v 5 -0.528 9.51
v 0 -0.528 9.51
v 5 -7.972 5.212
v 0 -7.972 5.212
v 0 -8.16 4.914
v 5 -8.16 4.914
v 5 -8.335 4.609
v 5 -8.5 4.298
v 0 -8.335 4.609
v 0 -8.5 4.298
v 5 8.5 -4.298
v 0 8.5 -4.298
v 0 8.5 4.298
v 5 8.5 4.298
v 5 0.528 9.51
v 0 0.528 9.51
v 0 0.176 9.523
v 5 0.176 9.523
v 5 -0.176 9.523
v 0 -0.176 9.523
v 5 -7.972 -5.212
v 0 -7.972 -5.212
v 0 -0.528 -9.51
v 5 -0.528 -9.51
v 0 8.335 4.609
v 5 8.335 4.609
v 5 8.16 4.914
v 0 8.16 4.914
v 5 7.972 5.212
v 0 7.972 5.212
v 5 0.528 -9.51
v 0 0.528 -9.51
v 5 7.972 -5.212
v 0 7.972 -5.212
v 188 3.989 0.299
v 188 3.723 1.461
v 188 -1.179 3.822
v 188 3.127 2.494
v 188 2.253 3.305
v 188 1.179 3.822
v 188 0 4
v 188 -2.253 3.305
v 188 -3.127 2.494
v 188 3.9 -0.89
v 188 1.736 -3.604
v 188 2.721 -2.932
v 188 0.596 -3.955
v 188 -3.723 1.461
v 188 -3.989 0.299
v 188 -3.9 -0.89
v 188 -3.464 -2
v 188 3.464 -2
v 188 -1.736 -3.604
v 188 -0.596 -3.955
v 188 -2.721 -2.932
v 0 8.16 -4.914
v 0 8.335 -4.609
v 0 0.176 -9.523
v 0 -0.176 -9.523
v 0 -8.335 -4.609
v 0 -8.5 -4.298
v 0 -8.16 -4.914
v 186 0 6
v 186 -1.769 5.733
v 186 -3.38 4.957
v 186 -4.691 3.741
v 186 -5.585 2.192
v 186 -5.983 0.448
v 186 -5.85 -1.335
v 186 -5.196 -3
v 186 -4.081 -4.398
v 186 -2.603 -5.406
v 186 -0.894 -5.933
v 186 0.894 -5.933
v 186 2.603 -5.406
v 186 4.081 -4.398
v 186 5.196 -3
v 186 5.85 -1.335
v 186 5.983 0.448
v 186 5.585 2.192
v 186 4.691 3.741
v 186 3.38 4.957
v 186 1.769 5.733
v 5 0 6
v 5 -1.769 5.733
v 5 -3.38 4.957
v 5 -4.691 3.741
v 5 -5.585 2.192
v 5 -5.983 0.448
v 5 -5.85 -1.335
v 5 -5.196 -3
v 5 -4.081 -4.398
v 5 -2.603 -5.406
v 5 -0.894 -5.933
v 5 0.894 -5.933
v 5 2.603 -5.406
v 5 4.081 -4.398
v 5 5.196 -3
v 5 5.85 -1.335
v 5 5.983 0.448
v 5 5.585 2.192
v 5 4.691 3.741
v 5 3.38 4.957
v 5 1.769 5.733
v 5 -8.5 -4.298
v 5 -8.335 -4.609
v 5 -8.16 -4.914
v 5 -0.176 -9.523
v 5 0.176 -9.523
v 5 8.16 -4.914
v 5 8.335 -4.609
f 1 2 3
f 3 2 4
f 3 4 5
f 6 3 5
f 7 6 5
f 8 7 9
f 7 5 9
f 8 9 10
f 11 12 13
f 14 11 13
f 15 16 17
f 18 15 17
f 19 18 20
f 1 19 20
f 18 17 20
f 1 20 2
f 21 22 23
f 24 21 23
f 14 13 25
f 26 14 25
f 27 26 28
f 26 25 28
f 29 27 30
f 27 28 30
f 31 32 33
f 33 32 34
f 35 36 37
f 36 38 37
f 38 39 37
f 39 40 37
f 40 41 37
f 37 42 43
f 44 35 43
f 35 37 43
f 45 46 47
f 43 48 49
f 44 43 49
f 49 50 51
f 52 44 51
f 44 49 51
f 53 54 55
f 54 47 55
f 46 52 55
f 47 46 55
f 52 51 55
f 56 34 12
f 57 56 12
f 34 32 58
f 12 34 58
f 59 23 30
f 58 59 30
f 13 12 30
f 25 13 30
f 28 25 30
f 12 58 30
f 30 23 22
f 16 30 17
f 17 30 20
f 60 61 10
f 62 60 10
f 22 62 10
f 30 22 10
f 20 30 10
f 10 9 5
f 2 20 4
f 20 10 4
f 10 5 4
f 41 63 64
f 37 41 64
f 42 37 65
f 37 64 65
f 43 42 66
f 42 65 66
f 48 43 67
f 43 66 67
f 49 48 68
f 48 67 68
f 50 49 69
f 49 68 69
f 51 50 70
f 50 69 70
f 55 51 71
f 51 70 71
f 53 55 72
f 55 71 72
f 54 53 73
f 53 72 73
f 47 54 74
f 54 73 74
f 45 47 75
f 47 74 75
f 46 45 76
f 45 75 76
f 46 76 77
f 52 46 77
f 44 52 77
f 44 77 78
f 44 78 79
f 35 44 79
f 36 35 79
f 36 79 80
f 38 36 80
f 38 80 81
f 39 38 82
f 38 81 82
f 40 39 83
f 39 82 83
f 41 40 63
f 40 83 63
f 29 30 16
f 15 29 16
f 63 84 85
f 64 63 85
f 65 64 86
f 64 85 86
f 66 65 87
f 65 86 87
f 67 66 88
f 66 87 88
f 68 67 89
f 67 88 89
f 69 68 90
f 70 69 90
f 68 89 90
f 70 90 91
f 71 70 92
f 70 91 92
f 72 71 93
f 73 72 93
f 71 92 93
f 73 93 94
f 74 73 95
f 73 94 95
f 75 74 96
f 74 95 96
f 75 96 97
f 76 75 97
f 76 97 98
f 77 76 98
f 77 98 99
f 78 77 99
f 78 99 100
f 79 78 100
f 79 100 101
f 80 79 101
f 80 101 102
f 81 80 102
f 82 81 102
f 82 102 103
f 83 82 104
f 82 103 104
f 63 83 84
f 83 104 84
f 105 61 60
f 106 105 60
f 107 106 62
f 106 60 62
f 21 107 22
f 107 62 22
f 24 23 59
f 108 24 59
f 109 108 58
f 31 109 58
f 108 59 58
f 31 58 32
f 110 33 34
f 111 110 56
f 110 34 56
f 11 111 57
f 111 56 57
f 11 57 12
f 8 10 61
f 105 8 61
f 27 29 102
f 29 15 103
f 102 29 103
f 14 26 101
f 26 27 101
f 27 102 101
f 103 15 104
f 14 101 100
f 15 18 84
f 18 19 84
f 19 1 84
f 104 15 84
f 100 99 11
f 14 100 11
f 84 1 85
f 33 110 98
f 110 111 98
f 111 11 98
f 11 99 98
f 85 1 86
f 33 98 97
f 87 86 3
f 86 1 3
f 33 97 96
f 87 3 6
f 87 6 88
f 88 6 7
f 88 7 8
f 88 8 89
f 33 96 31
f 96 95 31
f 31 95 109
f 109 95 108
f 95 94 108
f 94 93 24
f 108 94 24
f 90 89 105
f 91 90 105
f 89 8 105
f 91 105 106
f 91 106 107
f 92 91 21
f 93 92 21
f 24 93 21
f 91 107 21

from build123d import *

# Parameters (mm, degrees)
CHAFL_N1_SIZE         = 2
CORTAR_EXTRUIR1_REACH = 190.482


with BuildPart() as part:
    # Croquis1 → Revolución1 (revolve)
    with BuildSketch(Plane.XY, mode=Mode.PRIVATE) as revoluci_n1_sk:
        Polygon((0, 0), (188, 0), (188, 6), (5, 6), (5, 9.525), (0, 9.525), align=None)
    revolve(revoluci_n1_sk.sketch.rotate(Axis((0, 0, 0), (1, 0, 0)), 90), axis=Axis((0, 0, 0), (1, 0, 0)))

    # Chaflán1
    chafl_n1_edges = [part.edges().sort_by_distance(p)[0] for p in [
        (188, 0, -6),
    ]]
    chamfer(chafl_n1_edges, length=CHAFL_N1_SIZE)

    # Croquis2 → Cortar-Extruir1 (cut, up to next)
    with BuildSketch(Plane.ZY, mode=Mode.PRIVATE) as cortar_extruir1_sk1:
        with BuildLine():
            Line((-4.298328163, 8.5), (4.298328163, 8.5))
            ThreePointArc((4.298328163, 8.5), (0, 9.525), (-4.298328163, 8.5))
        make_face()
    cortar_extruir1_tool1 = extrude(cortar_extruir1_sk1.sketch, amount=-CORTAR_EXTRUIR1_REACH, mode=Mode.PRIVATE) & part.part
    # Croquis2 → Cortar-Extruir1 (cut, up to next)
    with BuildSketch(Plane.ZY, mode=Mode.PRIVATE) as cortar_extruir1_sk2:
        with BuildLine():
            Line((-9.510380014, 0.527538617), (-5.21205185, 7.972461383))
            ThreePointArc((-5.21205185, 7.972461383), (-8.248891971, 4.7625), (-9.510380014, 0.527538617))
        make_face()
    cortar_extruir1_tool2 = extrude(cortar_extruir1_sk2.sketch, amount=-CORTAR_EXTRUIR1_REACH, mode=Mode.PRIVATE) & part.part
    # Croquis2 → Cortar-Extruir1 (cut, up to next)
    with BuildSketch(Plane.ZY, mode=Mode.PRIVATE) as cortar_extruir1_sk3:
        with BuildLine():
            Line((-5.21205185, -7.972461383), (-9.510380014, -0.527538617))
            ThreePointArc((-9.510380014, -0.527538617), (-8.248891971, -4.7625), (-5.21205185, -7.972461383))
        make_face()
    cortar_extruir1_tool3 = extrude(cortar_extruir1_sk3.sketch, amount=-CORTAR_EXTRUIR1_REACH, mode=Mode.PRIVATE) & part.part
    # Croquis2 → Cortar-Extruir1 (cut, up to next)
    with BuildSketch(Plane.ZY, mode=Mode.PRIVATE) as cortar_extruir1_sk4:
        with BuildLine():
            ThreePointArc((-4.298328163, -8.5), (0, -9.525), (4.298328163, -8.5))
            Line((4.298328163, -8.5), (-4.298328163, -8.5))
        make_face()
    cortar_extruir1_tool4 = extrude(cortar_extruir1_sk4.sketch, amount=-CORTAR_EXTRUIR1_REACH, mode=Mode.PRIVATE) & part.part
    # Croquis2 → Cortar-Extruir1 (cut, up to next)
    with BuildSketch(Plane.ZY, mode=Mode.PRIVATE) as cortar_extruir1_sk5:
        with BuildLine():
            ThreePointArc((5.21205185, -7.972461383), (8.248891971, -4.7625), (9.510380014, -0.527538617))
            Line((9.510380014, -0.527538617), (5.21205185, -7.972461383))
        make_face()
    cortar_extruir1_tool5 = extrude(cortar_extruir1_sk5.sketch, amount=-CORTAR_EXTRUIR1_REACH, mode=Mode.PRIVATE) & part.part
    # Croquis2 → Cortar-Extruir1 (cut, up to next)
    with BuildSketch(Plane.ZY, mode=Mode.PRIVATE) as cortar_extruir1_sk6:
        with BuildLine():
            ThreePointArc((9.510380014, 0.527538617), (8.248891971, 4.7625), (5.21205185, 7.972461383))
            Line((5.21205185, 7.972461383), (9.510380014, 0.527538617))
        make_face()
    cortar_extruir1_tool6 = extrude(cortar_extruir1_sk6.sketch, amount=-CORTAR_EXTRUIR1_REACH, mode=Mode.PRIVATE) & part.part
    add(cortar_extruir1_tool1.solids().sort_by_distance((0, 8.911952, 0))[0], mode=Mode.SUBTRACT)
    add(cortar_extruir1_tool2.solids().sort_by_distance((0, 4.455976, -7.717977))[0], mode=Mode.SUBTRACT)
    add(cortar_extruir1_tool3.solids().sort_by_distance((0, -4.455976, -7.717977))[0], mode=Mode.SUBTRACT)
    add(cortar_extruir1_tool4.solids().sort_by_distance((0, -8.911952, 0))[0], mode=Mode.SUBTRACT)
    add(cortar_extruir1_tool5.solids().sort_by_distance((0, -4.455976, 7.717977))[0], mode=Mode.SUBTRACT)
    add(cortar_extruir1_tool6.solids().sort_by_distance((0, 4.455976, 7.717977))[0], mode=Mode.SUBTRACT)


solid = part.part
